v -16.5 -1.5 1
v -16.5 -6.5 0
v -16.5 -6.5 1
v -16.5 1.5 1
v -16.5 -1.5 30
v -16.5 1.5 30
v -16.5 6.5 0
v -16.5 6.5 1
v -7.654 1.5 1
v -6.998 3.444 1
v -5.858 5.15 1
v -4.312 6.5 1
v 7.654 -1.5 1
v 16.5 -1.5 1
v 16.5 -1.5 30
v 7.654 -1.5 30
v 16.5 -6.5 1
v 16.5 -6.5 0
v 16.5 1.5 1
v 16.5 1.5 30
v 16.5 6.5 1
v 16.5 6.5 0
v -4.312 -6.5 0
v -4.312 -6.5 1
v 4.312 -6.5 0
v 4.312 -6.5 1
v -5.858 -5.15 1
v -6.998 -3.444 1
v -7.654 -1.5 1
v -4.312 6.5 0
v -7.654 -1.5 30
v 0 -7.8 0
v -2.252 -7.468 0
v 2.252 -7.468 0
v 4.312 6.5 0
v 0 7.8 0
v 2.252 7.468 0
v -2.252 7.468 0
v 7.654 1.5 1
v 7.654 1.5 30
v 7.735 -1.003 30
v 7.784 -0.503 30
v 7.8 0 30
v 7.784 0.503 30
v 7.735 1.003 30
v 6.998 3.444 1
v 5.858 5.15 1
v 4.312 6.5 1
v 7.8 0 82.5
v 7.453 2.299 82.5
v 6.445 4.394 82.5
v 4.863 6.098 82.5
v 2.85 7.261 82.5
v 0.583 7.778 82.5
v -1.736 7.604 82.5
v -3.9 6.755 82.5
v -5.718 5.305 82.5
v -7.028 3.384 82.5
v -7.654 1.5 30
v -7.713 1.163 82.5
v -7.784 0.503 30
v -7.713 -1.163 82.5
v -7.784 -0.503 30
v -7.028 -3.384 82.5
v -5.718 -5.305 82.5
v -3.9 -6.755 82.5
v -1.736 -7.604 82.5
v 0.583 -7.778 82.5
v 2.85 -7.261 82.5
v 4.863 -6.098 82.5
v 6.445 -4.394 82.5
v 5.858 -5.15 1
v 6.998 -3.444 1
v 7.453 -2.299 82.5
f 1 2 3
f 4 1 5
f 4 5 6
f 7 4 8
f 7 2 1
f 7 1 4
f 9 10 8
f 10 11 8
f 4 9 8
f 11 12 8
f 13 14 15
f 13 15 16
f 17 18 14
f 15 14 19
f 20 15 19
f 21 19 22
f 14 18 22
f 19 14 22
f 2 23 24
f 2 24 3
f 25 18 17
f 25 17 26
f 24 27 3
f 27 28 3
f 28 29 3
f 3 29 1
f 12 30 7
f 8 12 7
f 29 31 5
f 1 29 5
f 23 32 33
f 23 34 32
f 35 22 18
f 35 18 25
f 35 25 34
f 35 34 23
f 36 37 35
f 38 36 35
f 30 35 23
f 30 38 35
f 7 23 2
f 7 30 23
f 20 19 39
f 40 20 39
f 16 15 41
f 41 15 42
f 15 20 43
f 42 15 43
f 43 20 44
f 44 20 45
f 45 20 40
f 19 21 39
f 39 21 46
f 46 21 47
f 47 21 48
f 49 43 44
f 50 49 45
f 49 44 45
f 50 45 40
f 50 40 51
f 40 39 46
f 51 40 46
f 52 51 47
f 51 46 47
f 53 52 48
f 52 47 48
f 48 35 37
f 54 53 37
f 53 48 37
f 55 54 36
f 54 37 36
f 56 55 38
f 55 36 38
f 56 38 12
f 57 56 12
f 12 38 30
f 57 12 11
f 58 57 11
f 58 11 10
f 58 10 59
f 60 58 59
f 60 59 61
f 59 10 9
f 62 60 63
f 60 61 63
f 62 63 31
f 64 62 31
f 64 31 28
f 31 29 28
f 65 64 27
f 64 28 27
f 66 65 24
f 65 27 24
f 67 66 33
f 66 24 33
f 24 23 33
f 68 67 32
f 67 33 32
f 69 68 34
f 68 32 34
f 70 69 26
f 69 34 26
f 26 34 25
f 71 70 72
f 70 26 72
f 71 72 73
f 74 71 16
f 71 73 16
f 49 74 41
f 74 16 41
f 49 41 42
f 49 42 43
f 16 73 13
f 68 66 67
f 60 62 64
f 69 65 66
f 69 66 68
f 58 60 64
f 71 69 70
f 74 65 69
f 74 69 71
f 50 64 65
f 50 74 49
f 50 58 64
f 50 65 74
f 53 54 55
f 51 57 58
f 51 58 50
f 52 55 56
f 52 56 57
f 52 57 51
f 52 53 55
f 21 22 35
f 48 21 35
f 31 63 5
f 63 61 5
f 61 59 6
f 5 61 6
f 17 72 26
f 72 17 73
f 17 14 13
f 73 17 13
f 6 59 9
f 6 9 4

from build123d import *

# Parameters (mm, degrees)
SKETCH1_R           = 7.8
BOSS_EXTRUDE1_DEPTH = 82.5
SKETCH2_W           = 33
SKETCH2_H           = 13
BOSS_EXTRUDE2_DEPTH = 1
SKETCH3_W           = 33
SKETCH3_H           = 3
BOSS_EXTRUDE3_DEPTH = 30


with BuildPart() as part:
    # Sketch1 → Boss-Extrude1 (new body)
    with BuildSketch(Plane.XY):
        Circle(SKETCH1_R)
    extrude(amount=BOSS_EXTRUDE1_DEPTH)

    # Sketch2 → Boss-Extrude2 (add)
    with BuildSketch(Plane(origin=(0, 0, 0), x_dir=(-1, 0, 0), z_dir=(0, 0, -1))):
        Rectangle(SKETCH2_W, SKETCH2_H)
    extrude(amount=-BOSS_EXTRUDE2_DEPTH)

    # Sketch3 → Boss-Extrude3 (add)
    with BuildSketch(Plane(origin=(0, 0, 0), x_dir=(-1, 0, 0), z_dir=(0, 0, -1))):
        Rectangle(SKETCH3_W, SKETCH3_H)
    extrude(amount=-BOSS_EXTRUDE3_DEPTH)


solid = part.part
